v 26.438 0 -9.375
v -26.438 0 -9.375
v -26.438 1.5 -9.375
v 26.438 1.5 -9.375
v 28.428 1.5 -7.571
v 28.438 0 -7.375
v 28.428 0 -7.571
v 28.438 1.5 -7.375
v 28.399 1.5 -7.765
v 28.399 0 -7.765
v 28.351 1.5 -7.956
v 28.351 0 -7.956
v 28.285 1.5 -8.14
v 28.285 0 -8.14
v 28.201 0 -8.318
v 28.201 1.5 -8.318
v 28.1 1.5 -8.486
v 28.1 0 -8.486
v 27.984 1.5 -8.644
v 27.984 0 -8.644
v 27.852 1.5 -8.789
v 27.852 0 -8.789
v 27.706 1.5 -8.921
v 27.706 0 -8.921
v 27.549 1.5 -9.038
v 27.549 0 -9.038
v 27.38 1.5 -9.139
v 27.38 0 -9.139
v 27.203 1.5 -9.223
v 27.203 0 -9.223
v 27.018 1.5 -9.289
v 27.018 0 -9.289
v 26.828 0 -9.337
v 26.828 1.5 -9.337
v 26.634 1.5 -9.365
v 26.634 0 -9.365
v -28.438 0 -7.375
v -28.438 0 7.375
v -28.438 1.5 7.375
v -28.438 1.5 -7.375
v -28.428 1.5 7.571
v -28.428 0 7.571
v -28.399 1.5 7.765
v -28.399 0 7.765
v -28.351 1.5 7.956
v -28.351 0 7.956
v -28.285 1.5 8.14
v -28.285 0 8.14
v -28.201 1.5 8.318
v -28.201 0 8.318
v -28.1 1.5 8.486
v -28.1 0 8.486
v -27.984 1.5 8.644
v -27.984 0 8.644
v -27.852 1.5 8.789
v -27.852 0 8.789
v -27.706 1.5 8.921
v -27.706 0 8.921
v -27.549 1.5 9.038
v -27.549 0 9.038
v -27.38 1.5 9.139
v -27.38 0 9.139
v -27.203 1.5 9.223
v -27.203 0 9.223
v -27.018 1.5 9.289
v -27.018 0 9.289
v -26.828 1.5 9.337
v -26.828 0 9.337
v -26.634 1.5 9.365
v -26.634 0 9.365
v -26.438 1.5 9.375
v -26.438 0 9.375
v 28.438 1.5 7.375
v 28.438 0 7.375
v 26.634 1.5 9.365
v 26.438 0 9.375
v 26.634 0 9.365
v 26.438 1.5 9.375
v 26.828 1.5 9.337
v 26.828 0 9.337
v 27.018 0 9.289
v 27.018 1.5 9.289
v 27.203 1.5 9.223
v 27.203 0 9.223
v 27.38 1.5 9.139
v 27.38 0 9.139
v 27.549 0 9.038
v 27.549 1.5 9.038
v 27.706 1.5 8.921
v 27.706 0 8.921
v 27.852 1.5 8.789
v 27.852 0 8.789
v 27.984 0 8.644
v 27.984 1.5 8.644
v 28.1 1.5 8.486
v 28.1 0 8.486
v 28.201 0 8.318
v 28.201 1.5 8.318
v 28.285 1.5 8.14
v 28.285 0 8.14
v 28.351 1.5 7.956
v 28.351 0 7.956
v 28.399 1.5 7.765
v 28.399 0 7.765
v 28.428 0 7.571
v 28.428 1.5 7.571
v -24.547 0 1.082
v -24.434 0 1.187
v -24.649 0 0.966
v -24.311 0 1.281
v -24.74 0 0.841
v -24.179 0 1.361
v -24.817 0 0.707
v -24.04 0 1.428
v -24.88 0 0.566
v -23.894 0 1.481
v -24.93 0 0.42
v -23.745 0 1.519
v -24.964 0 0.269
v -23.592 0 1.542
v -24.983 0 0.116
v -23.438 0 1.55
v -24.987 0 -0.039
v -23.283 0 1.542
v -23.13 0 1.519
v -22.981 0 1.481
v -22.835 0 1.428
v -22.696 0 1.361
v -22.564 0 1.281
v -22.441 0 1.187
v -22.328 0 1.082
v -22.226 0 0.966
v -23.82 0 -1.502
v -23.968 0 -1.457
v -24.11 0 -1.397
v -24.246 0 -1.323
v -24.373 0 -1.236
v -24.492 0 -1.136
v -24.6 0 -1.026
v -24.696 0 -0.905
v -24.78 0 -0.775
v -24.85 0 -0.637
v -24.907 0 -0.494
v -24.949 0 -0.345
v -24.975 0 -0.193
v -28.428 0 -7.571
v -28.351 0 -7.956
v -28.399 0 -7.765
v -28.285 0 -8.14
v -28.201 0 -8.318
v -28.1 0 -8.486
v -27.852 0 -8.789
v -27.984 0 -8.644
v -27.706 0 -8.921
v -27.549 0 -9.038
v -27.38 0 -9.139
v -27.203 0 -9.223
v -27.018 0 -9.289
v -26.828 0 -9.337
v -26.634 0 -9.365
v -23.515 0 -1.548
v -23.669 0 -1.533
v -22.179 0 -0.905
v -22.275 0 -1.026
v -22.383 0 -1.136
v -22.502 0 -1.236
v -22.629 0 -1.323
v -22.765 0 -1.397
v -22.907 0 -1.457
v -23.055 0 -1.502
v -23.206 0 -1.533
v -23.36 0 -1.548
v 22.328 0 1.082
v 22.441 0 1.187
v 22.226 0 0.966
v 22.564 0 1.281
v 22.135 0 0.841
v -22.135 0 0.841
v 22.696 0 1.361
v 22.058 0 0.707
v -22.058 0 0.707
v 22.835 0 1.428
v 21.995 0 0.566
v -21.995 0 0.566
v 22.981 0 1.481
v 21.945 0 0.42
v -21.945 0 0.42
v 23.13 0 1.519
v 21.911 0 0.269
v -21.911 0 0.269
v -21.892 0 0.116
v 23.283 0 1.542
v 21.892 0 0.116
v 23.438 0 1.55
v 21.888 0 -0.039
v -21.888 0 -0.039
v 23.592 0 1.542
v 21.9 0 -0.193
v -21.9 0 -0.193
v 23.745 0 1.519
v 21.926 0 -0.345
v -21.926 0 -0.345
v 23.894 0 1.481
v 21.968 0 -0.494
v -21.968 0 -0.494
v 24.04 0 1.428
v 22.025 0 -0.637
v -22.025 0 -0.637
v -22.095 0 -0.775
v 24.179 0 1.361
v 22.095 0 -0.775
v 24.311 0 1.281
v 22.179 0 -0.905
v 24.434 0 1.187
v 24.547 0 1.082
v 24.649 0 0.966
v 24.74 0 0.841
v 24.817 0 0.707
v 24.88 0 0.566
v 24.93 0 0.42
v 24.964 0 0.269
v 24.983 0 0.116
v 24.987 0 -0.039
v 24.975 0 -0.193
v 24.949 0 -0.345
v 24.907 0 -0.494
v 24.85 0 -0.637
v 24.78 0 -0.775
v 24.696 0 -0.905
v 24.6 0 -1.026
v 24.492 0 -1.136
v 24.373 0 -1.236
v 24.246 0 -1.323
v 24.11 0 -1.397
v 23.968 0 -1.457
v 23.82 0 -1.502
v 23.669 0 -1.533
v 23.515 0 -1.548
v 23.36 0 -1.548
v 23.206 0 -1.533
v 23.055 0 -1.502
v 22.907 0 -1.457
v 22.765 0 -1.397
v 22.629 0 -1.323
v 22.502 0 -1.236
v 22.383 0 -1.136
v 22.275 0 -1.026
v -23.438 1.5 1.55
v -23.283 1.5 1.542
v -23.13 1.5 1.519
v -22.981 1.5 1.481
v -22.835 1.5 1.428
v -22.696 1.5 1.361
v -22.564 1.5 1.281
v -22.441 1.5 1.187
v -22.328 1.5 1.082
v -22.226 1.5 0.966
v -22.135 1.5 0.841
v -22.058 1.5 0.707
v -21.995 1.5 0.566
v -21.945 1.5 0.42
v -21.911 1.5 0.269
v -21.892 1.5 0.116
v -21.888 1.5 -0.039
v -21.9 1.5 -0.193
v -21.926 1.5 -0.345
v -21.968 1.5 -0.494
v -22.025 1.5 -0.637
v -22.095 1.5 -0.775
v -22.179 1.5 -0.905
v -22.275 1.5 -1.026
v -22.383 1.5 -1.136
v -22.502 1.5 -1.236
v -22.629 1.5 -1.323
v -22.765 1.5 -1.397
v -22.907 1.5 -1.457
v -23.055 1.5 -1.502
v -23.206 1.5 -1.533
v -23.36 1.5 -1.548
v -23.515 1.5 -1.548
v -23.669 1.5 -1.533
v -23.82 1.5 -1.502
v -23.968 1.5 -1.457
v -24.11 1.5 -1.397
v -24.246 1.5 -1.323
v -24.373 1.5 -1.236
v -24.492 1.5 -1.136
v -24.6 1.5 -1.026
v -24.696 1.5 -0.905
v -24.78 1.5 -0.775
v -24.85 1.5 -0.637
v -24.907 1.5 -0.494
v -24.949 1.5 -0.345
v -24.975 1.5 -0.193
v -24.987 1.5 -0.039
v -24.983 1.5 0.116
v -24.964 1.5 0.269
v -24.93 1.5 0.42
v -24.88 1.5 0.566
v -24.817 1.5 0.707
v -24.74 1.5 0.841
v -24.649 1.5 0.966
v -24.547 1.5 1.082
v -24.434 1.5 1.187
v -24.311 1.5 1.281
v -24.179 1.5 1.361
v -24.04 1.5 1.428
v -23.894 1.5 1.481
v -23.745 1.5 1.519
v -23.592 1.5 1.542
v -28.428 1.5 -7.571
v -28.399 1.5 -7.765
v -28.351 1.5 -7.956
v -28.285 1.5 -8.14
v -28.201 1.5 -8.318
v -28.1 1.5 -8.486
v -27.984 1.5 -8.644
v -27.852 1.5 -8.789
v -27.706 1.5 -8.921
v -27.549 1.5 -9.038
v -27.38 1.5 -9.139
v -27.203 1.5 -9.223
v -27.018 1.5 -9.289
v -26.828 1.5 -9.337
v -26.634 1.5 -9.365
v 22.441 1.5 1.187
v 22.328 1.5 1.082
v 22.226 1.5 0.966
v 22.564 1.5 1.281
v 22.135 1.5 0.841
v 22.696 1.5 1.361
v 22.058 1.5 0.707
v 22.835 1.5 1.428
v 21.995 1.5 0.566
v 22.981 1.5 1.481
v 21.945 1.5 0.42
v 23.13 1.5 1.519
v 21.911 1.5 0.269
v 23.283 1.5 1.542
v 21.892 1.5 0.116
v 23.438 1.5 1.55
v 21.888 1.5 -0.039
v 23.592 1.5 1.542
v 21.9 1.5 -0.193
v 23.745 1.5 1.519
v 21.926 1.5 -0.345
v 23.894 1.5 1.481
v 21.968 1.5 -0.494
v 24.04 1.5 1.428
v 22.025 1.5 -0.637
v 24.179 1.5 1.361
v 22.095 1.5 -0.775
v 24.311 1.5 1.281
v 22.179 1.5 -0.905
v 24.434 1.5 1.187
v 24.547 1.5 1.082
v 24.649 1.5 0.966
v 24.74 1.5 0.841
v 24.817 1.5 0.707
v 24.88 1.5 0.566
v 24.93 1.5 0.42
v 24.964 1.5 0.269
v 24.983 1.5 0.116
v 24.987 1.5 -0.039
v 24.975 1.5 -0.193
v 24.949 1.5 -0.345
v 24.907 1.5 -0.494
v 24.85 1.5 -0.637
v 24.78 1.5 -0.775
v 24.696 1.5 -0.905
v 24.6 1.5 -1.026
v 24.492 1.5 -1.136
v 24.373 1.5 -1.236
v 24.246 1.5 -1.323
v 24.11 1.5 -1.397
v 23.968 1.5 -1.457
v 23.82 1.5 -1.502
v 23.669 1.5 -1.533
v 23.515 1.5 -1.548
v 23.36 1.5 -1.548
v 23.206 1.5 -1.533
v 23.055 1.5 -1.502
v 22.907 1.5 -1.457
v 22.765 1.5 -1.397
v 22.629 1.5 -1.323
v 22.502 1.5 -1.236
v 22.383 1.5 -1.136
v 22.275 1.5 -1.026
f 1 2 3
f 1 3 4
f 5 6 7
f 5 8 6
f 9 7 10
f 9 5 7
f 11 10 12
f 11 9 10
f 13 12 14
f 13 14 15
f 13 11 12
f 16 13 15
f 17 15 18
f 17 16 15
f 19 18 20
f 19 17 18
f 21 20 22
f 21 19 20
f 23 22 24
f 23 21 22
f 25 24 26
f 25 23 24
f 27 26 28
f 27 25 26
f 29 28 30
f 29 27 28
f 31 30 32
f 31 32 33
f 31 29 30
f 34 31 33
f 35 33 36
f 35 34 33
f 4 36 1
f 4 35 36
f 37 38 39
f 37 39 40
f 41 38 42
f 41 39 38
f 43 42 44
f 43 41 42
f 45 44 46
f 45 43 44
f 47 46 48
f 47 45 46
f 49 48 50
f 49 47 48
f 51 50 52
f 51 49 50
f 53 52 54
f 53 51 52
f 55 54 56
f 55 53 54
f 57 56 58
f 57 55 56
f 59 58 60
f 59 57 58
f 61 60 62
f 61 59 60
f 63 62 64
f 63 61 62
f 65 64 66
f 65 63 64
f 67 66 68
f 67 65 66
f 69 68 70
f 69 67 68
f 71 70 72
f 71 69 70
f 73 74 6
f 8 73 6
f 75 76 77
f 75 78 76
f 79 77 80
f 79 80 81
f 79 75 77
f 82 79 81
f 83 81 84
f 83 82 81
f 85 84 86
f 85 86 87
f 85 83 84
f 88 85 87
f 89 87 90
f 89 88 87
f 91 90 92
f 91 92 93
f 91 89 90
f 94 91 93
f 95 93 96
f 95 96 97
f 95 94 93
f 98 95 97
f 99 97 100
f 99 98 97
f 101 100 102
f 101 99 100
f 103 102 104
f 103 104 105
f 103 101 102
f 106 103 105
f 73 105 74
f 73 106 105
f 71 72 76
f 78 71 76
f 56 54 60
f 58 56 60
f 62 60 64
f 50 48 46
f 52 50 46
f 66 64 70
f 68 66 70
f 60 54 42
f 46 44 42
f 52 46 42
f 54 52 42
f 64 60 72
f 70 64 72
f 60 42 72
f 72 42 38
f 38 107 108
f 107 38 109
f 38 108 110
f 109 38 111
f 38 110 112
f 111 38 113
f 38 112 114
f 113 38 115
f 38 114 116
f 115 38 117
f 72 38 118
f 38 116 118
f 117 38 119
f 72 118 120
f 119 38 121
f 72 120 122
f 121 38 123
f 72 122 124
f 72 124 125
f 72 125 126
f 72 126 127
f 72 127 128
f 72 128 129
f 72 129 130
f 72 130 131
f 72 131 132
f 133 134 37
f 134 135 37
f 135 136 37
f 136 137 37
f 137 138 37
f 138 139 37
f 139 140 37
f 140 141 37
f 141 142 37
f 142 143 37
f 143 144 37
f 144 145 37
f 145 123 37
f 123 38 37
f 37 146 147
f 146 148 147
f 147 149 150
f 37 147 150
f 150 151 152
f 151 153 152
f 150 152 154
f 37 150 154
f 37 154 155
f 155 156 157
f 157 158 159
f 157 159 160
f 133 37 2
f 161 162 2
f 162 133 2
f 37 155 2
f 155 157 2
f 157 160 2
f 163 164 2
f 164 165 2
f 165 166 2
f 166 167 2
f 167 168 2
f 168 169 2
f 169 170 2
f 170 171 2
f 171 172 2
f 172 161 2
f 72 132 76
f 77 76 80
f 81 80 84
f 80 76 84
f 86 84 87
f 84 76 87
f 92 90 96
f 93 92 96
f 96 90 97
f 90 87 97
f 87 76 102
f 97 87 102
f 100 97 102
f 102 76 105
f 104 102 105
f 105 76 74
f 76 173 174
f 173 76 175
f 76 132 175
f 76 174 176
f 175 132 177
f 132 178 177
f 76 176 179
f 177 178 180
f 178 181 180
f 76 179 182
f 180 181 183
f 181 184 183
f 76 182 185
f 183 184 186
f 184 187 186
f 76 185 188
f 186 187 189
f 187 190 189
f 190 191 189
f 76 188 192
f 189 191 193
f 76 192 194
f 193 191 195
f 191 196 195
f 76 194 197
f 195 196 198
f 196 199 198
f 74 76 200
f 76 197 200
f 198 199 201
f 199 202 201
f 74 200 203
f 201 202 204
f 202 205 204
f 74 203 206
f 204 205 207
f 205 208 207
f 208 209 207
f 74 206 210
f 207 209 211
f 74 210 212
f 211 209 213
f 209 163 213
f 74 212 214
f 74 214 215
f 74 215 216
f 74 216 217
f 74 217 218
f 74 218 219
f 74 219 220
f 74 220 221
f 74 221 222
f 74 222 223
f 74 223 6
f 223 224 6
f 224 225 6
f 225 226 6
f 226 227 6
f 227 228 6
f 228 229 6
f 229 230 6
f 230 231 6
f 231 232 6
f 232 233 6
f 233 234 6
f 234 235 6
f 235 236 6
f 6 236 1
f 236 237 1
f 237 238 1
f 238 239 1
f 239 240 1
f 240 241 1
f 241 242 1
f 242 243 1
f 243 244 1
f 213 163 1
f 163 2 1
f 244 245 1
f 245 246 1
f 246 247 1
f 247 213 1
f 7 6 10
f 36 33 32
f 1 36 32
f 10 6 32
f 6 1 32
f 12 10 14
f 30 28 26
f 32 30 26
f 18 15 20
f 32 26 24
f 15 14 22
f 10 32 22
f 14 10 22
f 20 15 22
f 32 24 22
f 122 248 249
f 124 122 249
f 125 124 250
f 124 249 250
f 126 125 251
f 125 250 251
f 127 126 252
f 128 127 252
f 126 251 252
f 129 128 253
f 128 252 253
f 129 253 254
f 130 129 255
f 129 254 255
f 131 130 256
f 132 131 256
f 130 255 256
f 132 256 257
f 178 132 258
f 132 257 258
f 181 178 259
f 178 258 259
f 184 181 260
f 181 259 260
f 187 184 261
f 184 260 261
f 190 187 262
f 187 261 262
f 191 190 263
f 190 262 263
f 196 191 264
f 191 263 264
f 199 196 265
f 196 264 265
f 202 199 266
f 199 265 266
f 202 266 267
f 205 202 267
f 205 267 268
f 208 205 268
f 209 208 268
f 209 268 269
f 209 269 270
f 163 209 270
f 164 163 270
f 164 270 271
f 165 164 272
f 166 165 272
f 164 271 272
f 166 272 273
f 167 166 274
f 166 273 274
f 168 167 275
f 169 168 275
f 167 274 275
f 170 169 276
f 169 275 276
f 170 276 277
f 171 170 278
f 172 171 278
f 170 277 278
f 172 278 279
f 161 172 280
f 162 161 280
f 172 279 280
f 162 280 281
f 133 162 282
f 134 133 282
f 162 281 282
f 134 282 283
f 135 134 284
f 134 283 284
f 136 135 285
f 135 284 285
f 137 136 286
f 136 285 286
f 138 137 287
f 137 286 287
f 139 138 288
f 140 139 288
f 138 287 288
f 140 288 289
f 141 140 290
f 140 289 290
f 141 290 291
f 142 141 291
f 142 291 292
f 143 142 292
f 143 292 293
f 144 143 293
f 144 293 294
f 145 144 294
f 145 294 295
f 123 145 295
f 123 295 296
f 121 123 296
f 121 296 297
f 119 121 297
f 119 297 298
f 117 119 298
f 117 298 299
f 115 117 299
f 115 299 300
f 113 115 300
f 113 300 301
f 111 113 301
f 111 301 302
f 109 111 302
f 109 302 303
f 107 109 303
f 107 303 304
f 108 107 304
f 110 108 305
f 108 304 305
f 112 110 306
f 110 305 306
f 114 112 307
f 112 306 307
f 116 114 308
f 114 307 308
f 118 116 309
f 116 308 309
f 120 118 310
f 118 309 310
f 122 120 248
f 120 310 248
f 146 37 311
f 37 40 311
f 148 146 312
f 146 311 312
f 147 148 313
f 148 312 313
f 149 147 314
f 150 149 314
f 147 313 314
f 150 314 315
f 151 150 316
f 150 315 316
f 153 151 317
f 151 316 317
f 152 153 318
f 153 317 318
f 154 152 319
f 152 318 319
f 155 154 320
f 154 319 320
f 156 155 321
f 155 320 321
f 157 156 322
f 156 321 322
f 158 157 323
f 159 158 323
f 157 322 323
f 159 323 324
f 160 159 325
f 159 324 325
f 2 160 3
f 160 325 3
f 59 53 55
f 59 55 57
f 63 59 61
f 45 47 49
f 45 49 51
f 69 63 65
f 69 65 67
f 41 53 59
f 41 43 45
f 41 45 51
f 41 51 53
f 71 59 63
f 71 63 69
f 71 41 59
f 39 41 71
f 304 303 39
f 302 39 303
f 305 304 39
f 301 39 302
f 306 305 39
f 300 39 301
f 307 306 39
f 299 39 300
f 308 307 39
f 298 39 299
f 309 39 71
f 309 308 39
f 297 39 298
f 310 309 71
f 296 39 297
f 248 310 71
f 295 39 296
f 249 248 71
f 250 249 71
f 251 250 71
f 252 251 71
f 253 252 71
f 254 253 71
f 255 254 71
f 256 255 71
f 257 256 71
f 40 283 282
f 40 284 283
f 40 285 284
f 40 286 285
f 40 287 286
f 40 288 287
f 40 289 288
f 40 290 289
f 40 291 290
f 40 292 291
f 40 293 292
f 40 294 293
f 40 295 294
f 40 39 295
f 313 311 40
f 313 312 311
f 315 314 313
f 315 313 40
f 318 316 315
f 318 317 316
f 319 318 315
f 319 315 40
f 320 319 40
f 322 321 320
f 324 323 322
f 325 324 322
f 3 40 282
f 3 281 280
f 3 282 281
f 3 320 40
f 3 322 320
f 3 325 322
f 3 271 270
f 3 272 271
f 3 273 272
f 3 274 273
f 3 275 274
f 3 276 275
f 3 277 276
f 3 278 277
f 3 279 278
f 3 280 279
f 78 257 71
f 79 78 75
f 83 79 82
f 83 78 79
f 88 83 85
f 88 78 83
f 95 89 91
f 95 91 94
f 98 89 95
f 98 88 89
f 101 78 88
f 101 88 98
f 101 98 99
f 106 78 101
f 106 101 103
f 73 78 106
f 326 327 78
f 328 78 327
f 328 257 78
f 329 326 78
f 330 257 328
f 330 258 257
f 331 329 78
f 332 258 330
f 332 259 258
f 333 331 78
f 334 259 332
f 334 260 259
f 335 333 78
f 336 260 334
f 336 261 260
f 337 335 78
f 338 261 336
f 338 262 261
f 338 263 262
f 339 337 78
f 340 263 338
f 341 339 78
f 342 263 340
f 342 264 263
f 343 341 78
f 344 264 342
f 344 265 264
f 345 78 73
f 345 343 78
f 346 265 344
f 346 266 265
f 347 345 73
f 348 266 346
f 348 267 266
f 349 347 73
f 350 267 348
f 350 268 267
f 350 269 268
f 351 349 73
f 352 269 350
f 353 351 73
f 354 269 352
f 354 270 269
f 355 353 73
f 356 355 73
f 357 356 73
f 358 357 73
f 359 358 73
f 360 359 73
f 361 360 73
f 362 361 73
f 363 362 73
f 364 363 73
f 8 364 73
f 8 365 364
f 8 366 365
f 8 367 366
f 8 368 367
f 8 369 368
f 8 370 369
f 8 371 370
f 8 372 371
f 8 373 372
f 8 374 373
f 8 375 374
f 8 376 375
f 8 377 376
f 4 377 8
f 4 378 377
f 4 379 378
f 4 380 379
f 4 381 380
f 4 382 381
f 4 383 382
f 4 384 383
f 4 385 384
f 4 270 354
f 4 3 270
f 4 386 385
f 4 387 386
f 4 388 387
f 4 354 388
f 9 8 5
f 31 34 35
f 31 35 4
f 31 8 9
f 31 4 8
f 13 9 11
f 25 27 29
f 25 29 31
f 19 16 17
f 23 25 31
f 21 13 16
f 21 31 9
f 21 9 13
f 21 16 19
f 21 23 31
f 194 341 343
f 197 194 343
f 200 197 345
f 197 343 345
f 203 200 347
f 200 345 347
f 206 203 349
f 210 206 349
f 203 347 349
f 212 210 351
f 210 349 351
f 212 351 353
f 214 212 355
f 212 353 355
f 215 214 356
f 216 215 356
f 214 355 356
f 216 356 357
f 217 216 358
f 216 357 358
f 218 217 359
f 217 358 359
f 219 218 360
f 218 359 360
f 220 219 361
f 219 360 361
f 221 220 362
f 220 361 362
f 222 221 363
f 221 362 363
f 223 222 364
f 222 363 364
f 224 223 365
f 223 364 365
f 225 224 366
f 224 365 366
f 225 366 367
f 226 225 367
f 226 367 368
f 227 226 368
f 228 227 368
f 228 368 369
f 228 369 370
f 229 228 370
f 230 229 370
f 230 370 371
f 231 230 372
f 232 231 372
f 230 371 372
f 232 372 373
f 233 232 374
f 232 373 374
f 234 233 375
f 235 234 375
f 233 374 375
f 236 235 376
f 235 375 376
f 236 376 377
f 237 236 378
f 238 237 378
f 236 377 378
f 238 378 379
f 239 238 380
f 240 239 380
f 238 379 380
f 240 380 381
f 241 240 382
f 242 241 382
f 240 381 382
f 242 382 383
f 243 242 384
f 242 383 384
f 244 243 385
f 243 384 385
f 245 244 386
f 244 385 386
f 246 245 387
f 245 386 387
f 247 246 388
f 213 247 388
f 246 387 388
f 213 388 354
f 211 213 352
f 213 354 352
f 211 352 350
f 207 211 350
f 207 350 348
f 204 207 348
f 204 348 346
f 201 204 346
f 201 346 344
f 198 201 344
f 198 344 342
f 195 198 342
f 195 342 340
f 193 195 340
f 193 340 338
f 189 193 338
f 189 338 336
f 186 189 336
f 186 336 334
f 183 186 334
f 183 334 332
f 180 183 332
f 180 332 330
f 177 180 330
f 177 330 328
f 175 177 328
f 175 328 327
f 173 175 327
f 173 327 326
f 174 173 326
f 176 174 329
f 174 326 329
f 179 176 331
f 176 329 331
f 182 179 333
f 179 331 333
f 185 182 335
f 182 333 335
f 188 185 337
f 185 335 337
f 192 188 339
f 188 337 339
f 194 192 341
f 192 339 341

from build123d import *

# Parameters (mm, degrees)
SKETCH1_W           = 56.875
SKETCH1_H           = 18.75
BOSS_EXTRUDE1_DEPTH = 1.5
FILLET1_R           = 2
SKETCH2_R           = 1.55
CUT_EXTRUDE1_DEPTH  = 1.5


with BuildPart() as part:
    # Sketch1 → Boss-Extrude1 (new body)
    with BuildSketch(Plane(origin=(0, 0, 0), x_dir=(1, 0, 0), z_dir=(0, 1, 0))):
        Rectangle(SKETCH1_W, SKETCH1_H)
    extrude(amount=BOSS_EXTRUDE1_DEPTH)

    # Fillet1
    fillet1_edges = [part.edges().sort_by_distance(p)[0] for p in [
        (28.4375, 0.75, 9.375),
        (-28.4375, 0.75, 9.375),
        (-28.4375, 0.75, -9.375),
        (28.4375, 0.75, -9.375),
    ]]
    fillet(fillet1_edges, radius=FILLET1_R)

    # Sketch2 → Cut-Extrude1 (cut)
    with BuildSketch(Plane(origin=(0, 1.5, 0), x_dir=(1, 0, 0), z_dir=(0, 1, 0))):
        with Locations(Location((-23.4375, 0, 0), (0, 0, 270))):
            Circle(SKETCH2_R)
        with Locations(Location((23.4375, 0, 0), (0, 0, 270))):
            Circle(SKETCH2_R)
    extrude(amount=-CUT_EXTRUDE1_DEPTH, mode=Mode.SUBTRACT)


solid = part.part
